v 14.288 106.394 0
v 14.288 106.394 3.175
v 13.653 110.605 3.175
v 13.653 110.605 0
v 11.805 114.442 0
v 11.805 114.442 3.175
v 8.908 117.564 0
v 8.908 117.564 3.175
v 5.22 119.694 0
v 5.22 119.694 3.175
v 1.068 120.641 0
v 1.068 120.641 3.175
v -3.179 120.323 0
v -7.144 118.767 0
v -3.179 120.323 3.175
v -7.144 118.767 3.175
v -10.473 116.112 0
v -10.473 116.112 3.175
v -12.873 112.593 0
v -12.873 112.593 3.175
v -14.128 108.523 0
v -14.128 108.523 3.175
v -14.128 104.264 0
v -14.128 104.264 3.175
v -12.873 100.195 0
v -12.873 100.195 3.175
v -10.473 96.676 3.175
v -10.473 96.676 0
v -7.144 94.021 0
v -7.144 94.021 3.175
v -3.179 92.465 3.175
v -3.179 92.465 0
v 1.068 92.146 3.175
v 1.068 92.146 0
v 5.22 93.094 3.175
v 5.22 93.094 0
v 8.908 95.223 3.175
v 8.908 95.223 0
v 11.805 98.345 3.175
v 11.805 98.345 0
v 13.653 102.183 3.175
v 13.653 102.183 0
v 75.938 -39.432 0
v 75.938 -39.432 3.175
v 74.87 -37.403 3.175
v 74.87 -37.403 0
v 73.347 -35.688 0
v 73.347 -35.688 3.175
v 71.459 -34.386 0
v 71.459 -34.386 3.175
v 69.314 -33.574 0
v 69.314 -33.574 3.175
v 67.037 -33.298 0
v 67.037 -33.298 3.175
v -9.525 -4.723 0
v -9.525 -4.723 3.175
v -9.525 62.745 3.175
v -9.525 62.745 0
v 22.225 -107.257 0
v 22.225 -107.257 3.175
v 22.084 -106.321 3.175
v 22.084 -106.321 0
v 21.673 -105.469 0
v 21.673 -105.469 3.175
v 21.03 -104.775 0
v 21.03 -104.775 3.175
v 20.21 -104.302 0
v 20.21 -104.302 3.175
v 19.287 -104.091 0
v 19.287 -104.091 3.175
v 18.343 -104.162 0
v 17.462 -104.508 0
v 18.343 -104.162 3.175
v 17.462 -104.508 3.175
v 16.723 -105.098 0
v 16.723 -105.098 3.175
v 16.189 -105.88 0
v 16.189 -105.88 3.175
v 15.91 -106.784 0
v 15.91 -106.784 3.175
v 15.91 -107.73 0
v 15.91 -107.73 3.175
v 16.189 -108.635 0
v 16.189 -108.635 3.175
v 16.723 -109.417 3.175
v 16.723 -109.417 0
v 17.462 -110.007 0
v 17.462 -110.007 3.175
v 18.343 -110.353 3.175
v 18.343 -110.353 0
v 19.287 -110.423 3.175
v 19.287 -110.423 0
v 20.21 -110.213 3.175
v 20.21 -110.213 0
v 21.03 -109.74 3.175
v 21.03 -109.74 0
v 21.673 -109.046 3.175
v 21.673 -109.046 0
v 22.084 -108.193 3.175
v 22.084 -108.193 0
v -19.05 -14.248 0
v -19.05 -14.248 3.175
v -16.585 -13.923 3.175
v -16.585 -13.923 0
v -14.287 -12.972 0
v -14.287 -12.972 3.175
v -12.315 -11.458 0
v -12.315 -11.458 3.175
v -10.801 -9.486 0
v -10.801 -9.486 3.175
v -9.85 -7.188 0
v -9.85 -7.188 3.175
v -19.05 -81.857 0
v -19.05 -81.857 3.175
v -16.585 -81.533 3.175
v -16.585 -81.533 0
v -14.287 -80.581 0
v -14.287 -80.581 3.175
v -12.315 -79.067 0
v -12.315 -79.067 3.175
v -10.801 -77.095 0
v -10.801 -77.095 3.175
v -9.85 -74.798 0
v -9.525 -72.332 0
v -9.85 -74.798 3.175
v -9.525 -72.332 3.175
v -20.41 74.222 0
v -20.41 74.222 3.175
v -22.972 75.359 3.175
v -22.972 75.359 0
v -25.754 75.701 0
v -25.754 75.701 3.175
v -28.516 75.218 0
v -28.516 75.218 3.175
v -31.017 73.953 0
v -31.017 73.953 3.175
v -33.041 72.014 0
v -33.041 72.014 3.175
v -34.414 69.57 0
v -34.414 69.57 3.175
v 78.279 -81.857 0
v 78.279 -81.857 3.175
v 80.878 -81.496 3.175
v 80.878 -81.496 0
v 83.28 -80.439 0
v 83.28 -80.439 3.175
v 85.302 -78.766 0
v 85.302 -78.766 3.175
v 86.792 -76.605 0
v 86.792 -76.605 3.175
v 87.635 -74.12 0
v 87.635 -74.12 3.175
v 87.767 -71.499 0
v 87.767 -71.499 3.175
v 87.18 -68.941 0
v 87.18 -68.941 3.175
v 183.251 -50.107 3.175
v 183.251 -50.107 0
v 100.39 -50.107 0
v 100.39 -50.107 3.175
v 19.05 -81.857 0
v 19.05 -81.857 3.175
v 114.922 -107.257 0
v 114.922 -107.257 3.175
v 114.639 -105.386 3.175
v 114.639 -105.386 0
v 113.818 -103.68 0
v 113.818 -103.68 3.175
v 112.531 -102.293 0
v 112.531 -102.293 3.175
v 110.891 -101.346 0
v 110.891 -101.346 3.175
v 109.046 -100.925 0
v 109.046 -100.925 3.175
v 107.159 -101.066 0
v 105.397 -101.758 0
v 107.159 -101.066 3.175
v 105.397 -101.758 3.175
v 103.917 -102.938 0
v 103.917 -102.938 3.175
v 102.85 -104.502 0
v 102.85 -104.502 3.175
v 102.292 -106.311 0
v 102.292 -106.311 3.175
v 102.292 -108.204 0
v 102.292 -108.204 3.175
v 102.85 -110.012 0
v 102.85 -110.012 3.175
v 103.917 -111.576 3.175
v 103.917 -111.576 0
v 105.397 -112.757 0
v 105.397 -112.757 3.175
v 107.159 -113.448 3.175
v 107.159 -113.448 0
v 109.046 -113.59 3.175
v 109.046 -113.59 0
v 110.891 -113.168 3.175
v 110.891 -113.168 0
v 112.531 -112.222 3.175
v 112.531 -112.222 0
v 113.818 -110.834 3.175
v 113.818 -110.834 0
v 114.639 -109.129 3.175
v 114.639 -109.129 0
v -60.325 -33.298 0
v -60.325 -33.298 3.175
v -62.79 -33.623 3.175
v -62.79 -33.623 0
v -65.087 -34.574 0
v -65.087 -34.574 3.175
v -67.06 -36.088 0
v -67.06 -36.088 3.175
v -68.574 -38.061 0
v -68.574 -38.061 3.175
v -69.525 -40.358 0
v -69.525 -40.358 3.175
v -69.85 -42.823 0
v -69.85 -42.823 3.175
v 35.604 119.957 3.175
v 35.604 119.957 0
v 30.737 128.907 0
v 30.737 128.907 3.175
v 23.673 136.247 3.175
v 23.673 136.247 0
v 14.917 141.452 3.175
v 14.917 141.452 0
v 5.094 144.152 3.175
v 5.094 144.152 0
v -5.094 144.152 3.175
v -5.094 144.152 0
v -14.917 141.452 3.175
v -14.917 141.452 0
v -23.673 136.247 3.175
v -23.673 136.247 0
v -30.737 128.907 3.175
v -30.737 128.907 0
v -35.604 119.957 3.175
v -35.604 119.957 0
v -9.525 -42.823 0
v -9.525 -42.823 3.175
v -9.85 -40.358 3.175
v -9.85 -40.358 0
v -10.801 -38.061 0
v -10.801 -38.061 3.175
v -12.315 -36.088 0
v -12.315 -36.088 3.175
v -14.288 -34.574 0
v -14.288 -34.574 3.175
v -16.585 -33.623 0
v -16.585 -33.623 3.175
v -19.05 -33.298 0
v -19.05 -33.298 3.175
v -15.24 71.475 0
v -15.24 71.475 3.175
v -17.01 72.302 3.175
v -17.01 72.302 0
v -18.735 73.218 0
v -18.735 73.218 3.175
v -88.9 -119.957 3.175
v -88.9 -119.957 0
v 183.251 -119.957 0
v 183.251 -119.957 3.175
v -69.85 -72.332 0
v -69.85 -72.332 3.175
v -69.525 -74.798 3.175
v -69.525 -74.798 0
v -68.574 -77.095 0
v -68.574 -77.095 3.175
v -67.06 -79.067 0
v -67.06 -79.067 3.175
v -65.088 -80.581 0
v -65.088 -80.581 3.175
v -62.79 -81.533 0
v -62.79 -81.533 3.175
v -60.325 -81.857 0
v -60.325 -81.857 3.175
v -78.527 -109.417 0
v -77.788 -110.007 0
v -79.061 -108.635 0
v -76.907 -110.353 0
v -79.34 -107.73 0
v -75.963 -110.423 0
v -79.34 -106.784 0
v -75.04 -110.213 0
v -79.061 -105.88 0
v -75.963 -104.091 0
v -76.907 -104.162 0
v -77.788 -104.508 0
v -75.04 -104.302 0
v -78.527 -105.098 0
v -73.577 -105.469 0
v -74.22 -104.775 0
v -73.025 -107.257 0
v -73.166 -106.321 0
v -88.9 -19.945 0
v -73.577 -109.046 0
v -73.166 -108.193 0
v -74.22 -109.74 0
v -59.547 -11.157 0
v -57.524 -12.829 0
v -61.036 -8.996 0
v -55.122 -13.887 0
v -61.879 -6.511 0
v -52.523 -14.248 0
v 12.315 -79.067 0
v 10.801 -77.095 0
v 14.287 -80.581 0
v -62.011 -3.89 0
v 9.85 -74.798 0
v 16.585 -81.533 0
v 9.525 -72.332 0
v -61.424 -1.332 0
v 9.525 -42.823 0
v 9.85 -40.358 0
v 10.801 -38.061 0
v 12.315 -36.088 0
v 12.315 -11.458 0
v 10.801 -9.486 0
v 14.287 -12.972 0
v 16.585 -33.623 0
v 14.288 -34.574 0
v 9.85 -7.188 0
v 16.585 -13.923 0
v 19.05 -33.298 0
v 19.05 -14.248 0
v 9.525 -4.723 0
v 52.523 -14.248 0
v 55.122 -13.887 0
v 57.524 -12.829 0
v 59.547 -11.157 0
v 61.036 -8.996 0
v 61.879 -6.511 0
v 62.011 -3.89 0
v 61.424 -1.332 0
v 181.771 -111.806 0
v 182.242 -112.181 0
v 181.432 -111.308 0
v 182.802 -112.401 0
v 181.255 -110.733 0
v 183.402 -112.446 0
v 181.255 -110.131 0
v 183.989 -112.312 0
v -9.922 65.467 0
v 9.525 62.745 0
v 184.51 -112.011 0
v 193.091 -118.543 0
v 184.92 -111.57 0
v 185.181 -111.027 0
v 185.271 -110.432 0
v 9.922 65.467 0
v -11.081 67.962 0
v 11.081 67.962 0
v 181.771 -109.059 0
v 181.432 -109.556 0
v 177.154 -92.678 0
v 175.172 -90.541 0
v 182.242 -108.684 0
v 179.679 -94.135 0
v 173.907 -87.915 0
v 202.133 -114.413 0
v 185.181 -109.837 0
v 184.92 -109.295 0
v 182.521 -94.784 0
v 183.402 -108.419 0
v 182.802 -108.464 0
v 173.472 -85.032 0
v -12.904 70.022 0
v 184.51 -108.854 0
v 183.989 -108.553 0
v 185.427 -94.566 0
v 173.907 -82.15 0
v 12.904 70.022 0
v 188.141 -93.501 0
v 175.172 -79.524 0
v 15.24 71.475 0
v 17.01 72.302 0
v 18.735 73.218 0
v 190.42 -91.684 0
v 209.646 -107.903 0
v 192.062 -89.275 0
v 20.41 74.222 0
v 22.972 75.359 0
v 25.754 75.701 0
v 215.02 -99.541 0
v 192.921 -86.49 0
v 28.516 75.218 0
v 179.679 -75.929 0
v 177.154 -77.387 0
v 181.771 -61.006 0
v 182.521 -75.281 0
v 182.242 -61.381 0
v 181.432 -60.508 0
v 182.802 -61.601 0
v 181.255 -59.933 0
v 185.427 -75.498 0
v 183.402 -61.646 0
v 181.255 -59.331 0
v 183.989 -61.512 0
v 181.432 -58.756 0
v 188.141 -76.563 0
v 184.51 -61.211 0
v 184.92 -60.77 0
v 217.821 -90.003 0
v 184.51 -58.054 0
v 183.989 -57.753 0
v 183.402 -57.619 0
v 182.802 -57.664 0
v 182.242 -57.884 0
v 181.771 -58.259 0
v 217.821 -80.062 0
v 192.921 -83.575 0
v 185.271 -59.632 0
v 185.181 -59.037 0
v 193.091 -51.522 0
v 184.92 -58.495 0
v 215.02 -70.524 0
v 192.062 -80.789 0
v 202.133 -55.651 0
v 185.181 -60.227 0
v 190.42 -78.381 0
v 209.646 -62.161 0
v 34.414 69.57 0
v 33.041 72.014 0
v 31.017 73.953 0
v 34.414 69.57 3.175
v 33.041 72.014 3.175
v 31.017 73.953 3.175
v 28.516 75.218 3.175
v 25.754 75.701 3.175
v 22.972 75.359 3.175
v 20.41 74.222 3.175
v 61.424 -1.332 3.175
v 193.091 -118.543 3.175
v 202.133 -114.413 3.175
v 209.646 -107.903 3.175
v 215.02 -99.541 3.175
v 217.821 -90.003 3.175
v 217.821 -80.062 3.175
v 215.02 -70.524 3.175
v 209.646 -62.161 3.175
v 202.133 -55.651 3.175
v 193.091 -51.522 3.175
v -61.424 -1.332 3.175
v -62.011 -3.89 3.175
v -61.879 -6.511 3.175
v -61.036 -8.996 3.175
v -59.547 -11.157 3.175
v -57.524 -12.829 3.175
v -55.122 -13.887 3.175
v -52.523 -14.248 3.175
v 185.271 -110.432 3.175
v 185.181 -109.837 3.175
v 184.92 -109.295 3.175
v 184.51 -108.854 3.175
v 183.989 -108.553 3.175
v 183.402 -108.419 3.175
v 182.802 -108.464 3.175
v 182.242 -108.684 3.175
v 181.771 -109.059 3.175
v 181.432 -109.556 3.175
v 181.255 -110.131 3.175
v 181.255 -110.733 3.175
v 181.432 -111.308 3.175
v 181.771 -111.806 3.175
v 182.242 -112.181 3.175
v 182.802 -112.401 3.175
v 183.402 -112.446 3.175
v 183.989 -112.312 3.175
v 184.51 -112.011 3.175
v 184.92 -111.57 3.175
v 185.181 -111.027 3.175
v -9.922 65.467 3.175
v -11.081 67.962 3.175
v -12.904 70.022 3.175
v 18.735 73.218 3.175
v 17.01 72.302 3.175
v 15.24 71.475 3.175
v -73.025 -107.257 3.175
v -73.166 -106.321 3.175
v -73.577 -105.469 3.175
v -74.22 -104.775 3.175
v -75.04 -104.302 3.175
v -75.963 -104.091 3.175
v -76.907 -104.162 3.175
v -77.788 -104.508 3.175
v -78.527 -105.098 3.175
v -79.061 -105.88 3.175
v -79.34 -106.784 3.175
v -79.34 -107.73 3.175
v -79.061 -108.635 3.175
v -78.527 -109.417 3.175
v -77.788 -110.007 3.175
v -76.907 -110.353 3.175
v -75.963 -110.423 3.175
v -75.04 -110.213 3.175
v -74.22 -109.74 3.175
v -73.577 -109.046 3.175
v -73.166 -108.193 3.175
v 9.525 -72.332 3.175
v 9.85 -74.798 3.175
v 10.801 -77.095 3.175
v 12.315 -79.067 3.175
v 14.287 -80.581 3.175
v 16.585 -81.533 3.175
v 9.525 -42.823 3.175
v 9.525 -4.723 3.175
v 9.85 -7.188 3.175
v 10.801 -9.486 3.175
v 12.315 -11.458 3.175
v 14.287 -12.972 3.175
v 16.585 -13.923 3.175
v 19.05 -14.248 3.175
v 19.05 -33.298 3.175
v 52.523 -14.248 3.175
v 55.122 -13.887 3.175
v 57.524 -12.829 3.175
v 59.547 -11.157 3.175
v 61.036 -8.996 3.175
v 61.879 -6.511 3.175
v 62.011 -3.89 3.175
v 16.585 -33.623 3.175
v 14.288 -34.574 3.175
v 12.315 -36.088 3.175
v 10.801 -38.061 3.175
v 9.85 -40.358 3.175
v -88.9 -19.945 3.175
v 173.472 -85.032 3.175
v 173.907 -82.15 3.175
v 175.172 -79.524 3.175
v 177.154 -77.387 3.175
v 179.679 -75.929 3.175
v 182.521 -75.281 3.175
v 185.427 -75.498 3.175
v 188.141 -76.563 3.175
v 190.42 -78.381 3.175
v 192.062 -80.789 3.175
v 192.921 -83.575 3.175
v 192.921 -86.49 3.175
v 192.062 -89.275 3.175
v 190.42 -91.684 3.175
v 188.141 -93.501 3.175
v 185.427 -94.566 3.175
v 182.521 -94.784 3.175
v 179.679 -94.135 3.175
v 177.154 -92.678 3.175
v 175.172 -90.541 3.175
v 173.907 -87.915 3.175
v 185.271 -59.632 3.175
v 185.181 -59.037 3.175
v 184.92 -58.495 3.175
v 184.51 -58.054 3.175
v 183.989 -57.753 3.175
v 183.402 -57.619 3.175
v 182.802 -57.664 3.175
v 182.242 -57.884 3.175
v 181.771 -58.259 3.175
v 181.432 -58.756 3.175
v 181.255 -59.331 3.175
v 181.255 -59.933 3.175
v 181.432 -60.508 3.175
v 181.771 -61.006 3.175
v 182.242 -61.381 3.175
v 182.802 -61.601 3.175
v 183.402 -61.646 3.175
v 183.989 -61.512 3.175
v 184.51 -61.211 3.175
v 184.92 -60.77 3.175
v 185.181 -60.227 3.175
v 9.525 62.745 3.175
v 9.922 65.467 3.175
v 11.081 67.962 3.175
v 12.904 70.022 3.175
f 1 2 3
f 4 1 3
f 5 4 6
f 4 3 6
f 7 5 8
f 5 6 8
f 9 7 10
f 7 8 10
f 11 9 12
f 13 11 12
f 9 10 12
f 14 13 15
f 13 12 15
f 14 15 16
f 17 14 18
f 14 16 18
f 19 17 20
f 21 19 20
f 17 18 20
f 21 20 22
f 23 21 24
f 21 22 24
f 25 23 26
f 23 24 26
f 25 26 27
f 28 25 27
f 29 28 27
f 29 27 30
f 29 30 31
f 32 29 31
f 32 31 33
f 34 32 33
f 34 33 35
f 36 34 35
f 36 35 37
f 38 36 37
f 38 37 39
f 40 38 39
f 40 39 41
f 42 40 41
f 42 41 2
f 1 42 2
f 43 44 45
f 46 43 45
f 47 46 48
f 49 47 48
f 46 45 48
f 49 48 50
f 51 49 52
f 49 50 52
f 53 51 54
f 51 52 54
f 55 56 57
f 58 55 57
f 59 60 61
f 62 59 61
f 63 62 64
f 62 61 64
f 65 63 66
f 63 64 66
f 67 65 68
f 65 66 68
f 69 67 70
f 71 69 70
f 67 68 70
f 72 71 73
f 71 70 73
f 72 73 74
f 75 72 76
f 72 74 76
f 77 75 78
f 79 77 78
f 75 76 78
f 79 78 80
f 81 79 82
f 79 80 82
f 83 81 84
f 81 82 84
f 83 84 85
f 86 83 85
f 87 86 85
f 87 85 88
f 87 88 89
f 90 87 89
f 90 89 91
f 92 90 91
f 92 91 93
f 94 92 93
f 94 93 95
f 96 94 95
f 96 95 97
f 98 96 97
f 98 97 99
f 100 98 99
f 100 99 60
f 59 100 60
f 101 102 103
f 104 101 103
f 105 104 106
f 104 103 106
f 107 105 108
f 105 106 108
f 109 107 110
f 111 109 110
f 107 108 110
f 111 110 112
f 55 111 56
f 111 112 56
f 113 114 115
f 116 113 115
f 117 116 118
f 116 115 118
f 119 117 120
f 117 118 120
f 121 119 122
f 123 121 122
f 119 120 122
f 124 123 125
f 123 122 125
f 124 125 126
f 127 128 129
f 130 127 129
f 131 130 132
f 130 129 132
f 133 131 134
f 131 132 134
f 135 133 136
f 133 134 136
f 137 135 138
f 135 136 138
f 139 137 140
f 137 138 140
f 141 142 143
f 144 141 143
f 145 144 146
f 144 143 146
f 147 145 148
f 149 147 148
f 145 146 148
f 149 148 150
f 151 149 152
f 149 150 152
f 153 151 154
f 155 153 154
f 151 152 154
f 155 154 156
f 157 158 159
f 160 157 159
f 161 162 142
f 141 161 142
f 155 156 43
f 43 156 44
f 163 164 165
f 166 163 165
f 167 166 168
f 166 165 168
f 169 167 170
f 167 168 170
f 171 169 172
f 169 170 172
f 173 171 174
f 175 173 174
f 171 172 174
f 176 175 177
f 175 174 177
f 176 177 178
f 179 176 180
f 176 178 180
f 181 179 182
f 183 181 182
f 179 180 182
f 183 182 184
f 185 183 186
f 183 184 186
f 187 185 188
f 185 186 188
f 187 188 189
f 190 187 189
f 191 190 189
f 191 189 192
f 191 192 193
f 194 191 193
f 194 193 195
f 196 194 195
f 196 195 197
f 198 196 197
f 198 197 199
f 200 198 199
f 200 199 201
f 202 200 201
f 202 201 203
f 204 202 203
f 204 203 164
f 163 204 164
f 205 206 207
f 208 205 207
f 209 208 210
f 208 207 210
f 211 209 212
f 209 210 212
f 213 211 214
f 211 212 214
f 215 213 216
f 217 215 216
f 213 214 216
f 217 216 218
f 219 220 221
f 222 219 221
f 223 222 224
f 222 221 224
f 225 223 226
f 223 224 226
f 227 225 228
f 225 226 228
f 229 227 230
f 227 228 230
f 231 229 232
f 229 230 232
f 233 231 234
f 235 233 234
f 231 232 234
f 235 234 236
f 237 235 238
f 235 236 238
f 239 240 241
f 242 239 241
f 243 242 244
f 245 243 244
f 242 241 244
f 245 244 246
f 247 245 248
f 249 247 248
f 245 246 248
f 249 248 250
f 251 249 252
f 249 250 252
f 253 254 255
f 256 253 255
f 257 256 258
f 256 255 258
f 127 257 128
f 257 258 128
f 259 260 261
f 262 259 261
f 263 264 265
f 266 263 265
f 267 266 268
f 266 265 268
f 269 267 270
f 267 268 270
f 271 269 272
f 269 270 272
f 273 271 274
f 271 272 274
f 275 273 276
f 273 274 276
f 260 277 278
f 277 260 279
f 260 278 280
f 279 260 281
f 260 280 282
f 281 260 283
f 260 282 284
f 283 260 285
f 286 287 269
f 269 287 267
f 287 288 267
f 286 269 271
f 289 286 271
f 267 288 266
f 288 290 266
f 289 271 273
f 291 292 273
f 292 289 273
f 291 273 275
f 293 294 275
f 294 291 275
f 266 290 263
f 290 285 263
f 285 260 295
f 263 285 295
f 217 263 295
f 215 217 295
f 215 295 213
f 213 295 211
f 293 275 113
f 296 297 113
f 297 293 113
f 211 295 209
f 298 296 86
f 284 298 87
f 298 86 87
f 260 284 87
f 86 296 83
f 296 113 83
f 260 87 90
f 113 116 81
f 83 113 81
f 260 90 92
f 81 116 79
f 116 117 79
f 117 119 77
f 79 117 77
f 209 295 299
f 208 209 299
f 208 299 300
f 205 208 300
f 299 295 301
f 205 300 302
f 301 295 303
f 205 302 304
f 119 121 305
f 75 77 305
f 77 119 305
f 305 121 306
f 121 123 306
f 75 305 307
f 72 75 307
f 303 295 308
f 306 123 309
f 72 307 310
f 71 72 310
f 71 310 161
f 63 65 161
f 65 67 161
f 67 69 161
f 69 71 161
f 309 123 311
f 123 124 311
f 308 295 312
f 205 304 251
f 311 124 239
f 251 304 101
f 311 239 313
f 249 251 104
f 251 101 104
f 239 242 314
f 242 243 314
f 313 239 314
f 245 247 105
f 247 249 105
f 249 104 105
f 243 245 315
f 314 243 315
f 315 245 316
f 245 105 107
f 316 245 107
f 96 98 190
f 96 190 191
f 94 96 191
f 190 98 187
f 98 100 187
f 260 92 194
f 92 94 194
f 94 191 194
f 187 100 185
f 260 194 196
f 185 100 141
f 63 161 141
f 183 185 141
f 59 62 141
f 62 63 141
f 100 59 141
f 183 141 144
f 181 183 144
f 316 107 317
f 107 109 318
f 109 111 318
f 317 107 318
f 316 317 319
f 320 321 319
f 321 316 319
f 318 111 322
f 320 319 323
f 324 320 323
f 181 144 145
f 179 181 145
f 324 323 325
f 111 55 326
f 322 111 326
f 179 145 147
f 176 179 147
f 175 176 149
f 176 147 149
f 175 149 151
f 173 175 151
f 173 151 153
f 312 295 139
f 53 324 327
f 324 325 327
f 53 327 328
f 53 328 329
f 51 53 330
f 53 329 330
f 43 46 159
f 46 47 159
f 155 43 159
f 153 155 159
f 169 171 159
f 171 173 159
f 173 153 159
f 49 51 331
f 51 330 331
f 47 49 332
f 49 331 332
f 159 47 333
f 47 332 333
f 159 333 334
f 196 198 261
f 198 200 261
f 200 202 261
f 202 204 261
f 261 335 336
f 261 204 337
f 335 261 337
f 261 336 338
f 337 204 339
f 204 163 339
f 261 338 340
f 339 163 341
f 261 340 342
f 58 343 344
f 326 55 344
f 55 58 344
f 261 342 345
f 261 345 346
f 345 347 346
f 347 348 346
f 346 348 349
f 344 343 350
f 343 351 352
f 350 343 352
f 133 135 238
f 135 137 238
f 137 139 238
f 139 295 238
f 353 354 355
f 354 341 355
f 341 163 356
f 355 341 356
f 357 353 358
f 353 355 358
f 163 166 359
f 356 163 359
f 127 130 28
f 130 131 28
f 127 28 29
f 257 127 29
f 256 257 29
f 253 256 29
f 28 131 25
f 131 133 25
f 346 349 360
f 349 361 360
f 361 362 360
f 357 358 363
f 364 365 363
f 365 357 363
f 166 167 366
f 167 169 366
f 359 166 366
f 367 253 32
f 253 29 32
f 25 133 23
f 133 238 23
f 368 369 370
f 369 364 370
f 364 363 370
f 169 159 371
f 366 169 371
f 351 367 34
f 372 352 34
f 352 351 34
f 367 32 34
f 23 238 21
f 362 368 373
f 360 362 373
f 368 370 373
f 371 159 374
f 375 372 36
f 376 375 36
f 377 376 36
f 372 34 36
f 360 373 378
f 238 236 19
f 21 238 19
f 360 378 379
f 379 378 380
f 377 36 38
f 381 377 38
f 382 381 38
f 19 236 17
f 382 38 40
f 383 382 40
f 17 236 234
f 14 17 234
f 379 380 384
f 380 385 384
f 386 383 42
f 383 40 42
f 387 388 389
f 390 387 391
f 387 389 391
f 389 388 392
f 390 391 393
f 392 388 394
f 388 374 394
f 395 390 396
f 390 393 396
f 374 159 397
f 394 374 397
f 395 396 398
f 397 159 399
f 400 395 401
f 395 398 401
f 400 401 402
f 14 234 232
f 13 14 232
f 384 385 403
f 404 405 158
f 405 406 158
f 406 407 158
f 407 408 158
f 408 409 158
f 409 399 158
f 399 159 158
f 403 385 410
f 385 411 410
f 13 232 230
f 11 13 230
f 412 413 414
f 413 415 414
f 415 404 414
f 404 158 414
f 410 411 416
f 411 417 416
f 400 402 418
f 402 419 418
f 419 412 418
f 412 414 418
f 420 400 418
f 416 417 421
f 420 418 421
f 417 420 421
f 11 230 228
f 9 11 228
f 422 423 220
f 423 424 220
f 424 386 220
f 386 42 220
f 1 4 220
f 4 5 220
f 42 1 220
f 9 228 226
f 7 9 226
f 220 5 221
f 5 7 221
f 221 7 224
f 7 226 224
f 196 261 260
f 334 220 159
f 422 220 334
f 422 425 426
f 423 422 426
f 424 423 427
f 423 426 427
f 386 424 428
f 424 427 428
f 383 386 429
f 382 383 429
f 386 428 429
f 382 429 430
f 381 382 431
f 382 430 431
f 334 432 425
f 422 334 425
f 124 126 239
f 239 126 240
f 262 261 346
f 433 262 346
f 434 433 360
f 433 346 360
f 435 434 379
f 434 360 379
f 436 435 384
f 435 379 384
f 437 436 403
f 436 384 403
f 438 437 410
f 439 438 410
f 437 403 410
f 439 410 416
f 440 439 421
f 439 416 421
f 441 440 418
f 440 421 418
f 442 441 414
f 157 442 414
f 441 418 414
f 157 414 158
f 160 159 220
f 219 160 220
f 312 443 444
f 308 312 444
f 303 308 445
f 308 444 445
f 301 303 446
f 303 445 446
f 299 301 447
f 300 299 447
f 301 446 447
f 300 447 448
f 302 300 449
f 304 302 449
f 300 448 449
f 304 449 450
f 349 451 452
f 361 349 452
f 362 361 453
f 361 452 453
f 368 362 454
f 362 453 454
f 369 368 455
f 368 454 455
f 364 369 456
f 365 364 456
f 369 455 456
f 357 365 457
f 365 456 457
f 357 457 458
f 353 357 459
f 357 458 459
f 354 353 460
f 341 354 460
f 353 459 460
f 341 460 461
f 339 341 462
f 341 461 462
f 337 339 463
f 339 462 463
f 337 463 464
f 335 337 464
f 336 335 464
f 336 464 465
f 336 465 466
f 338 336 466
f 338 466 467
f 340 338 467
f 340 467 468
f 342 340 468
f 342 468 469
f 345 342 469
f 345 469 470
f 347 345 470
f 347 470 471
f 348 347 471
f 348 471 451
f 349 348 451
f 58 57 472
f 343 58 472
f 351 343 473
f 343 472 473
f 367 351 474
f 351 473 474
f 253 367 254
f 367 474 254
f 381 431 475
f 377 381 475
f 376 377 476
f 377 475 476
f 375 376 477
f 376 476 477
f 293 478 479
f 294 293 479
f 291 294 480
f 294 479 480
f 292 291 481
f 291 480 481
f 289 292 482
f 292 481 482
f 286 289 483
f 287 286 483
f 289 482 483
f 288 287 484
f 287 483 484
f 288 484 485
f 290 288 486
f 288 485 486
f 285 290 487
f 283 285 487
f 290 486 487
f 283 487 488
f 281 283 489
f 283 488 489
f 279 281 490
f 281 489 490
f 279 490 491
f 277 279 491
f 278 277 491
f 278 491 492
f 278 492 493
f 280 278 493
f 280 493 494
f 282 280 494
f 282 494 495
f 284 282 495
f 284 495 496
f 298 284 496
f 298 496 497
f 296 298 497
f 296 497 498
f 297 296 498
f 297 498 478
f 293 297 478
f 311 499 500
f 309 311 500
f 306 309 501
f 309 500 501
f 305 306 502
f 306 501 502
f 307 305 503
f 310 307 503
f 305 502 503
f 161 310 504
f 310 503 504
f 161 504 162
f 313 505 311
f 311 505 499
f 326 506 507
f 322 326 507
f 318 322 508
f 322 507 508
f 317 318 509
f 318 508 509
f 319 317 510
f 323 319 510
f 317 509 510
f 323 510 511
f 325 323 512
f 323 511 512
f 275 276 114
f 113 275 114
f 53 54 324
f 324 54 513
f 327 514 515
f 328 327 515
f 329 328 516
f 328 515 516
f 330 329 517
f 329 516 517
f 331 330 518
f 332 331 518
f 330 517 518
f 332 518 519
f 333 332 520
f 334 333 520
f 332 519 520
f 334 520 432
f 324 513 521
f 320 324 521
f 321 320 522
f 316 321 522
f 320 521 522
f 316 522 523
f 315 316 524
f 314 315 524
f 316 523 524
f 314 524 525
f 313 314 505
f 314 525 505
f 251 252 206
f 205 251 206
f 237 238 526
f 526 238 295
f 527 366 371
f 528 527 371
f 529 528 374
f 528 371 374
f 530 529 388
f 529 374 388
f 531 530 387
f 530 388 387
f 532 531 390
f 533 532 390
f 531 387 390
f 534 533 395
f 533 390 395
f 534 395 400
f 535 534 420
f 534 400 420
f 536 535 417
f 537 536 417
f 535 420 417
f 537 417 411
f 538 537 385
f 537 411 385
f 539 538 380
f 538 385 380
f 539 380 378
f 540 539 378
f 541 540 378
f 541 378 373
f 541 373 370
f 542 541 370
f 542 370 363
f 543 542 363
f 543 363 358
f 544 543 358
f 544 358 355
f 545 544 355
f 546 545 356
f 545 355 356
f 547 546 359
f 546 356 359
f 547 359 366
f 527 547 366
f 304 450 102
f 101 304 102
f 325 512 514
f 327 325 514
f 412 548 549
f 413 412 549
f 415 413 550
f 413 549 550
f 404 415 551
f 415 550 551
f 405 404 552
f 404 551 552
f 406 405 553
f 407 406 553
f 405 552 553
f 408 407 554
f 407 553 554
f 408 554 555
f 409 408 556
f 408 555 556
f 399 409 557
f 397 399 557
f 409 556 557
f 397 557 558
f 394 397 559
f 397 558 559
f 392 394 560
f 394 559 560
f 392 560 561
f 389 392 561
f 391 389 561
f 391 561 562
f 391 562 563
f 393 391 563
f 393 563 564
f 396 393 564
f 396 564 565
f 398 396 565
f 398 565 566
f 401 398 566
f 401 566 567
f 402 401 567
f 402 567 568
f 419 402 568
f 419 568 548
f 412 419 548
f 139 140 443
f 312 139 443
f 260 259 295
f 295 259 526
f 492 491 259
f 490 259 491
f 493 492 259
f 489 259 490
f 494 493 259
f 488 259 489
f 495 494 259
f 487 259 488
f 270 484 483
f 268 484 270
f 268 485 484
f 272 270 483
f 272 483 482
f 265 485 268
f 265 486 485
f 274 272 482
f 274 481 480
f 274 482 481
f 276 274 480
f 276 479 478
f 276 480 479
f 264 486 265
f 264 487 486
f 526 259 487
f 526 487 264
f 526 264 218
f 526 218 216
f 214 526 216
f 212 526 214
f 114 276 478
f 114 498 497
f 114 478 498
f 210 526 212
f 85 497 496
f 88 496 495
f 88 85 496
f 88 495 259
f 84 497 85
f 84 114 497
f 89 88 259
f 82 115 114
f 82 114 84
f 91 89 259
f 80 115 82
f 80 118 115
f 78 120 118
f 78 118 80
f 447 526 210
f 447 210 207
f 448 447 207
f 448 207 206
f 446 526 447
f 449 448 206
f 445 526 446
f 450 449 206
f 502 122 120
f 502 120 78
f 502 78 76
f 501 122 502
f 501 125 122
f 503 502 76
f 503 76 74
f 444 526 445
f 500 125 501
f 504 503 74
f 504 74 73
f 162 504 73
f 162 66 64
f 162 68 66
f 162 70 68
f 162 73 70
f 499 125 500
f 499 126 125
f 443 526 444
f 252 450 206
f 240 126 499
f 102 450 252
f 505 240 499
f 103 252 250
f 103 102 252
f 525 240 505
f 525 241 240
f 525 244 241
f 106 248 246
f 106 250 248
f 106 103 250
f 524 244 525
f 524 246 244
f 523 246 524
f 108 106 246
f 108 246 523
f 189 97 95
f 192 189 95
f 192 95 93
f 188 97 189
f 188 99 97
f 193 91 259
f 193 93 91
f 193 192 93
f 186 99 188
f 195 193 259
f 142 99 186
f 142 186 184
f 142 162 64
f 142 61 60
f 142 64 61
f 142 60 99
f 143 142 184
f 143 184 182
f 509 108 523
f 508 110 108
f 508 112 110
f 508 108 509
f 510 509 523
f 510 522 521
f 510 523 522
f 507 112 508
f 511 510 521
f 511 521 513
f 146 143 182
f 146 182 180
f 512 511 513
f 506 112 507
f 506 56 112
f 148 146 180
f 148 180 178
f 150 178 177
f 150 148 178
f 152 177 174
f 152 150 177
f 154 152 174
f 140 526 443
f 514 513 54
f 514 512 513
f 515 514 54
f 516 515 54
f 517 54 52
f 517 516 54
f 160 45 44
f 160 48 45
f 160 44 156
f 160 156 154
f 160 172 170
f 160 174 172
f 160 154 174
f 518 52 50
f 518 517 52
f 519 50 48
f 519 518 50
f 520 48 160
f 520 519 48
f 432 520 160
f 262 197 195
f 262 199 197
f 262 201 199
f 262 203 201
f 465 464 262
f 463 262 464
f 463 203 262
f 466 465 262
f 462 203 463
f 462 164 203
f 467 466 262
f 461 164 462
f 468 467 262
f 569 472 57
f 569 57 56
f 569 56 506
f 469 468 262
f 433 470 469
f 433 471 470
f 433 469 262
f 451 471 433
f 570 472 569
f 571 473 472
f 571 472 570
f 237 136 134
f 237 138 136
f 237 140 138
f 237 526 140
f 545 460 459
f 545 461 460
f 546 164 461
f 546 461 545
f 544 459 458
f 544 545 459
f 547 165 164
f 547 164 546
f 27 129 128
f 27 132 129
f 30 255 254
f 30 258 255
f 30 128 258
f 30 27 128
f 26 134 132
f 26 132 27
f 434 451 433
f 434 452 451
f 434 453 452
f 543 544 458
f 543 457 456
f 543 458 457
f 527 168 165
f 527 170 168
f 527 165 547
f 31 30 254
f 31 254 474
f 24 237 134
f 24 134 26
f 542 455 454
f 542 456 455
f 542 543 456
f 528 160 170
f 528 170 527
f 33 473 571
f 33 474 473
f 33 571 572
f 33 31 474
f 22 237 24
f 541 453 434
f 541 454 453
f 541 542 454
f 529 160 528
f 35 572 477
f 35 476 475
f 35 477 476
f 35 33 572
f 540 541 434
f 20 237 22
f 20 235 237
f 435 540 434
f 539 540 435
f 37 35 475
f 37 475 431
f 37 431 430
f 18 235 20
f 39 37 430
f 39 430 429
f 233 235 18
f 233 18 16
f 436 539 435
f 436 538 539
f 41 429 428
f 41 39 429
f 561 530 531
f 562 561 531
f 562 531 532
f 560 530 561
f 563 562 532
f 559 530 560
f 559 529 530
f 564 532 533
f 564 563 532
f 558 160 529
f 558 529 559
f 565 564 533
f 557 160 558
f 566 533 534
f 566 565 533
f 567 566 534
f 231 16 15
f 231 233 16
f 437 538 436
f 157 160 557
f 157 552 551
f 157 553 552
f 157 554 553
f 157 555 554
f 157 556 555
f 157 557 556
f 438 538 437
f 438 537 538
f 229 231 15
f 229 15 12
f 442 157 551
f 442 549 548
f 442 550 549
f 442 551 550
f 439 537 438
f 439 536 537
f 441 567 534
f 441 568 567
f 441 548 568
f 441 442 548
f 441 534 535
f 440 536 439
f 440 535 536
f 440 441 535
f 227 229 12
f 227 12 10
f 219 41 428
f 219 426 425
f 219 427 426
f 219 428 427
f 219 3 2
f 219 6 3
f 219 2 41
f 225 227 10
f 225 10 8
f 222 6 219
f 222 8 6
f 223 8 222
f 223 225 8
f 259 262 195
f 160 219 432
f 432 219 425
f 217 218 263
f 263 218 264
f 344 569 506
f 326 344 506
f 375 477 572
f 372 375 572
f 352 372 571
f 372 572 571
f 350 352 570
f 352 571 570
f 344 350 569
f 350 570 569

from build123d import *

# Parameters (mm, degrees)
BOSS_EXTRUDE1_DEPTH = 3.175
SKETCH2_R           = 14.2875
CUT_EXTRUDE1_DEPTH  = 4.175
SKETCH4_R           = 6.35
SKETCH4_R_2         = 3.175
CUT_EXTRUDE2_DEPTH  = 4.175
SKETCH8_R           = 9.779
BOSS_EXTRUDE3_DEPTH = 3.175
SKETCH9_R           = 2.0193
CUT_EXTRUDE3_DEPTH  = 4.175
SKETCH10_W          = 38.1
SKETCH10_H          = 100.0125
CUT_EXTRUDE4_DEPTH  = 4.175
CUT_EXTRUDE5_DEPTH  = 4.175


with BuildPart() as part:
    # Sketch1 → Boss-Extrude1 (new body)
    with BuildSketch(Plane.XY):
        with BuildLine():
            Line((-35.603982701, 119.957272705), (-127, -119.957272705))
            Line((-127, -119.957272705), (127, -119.957272705))
            Line((127, -119.957272705), (35.603982701, 119.957272705))
            ThreePointArc((35.603982701, 119.957272705), (0, 144.493850724), (-35.603982701, 119.957272705))
        make_face()
    extrude(amount=BOSS_EXTRUDE1_DEPTH)

    # Sketch2 → Cut-Extrude1 (cut, through all)
    with BuildSketch(Plane.XY.offset(3.175)):
        with Locations((0, 106.393850724)):
            Circle(SKETCH2_R)
    extrude(amount=-CUT_EXTRUDE1_DEPTH, mode=Mode.SUBTRACT)

    # Sketch4 → Cut-Extrude2 (cut, through all)
    with BuildSketch(Plane.XY.offset(3.175)):
        with Locations((108.571571229, -107.257272705)):
            Circle(SKETCH4_R)
        with Locations((-76.2, -107.257272705)):
            Circle(SKETCH4_R_2)
        with Locations((19.05, -107.257272705)):
            Circle(SKETCH4_R_2)
    extrude(amount=-CUT_EXTRUDE2_DEPTH, mode=Mode.SUBTRACT)

    # Sketch8 → Boss-Extrude3 (add)
    with BuildSketch(Plane(origin=(0, 0, 0), x_dir=(-1, 0, 0), z_dir=(0, 0, -1))):
        with BuildLine():
            Line((-127, -119.957272705), (-183.251300865, -119.957272705))
            ThreePointArc((-183.251300865, -119.957272705), (-218.176300865, -85.032272705), (-183.251300865, -50.107272705))
            Line((-183.251300865, -50.107272705), (-100.39047619, -50.107272705))
            Line((-100.39047619, -50.107272705), (-127, -119.957272705))
        make_face()
        with Locations((-183.251300865, -85.032272705)):
            Circle(SKETCH8_R, mode=Mode.SUBTRACT)
    extrude(amount=-BOSS_EXTRUDE3_DEPTH)

    # Sketch9 → Cut-Extrude3 (cut, through all)
    with BuildSketch(Plane.XY.offset(3.175)):
        with Locations((183.251300865, -59.632272705)):
            Circle(SKETCH9_R)
        with Locations((183.251300865, -110.432272705)):
            Circle(SKETCH9_R)
    extrude(amount=-CUT_EXTRUDE3_DEPTH, mode=Mode.SUBTRACT)

    # Sketch10 → Cut-Extrude4 (cut, through all)
    with BuildSketch(Plane.XY.offset(3.175)):
        with Locations((-107.95, -69.951022705)):
            Rectangle(SKETCH10_W, SKETCH10_H)
    extrude(amount=-CUT_EXTRUDE4_DEPTH, mode=Mode.SUBTRACT)

    # Sketch11 → Cut-Extrude5 (cut, through all)
    with BuildSketch(Plane.XY.offset(3.175)):
        with BuildLine():
            Line((-34.41372286, 69.569766501), (-61.423985812, -1.332173746))
            ThreePointArc((-61.423985812, -1.332173746), (-60.365933576, -10.128014274), (-52.522990136, -14.248029241))
            Line((-52.522990136, -14.248029241), (-19.05, -14.248029241))
            ThreePointArc((-19.05, -14.248029241), (-12.314807909, -11.458221332), (-9.525, -4.723029241))
            Line((-9.525, -4.723029241), (-9.525, 62.74481723))
            ThreePointArc((-9.525, 62.74481723), (-11.080813247, 67.96187459), (-15.24, 71.474623928))
            ThreePointArc((-15.24, 71.474623928), (-17.877940169, 72.748802718), (-20.410181748, 74.221898949))
            ThreePointArc((-20.410181748, 74.221898949), (-28.515665768, 75.218157925), (-34.41372286, 69.569766501))
        make_face()
        with BuildLine():
            Line((19.05, -14.248029241), (52.522990136, -14.248029241))
            ThreePointArc((52.522990136, -14.248029241), (60.365933576, -10.128014274), (61.423985812, -1.332173746))
            Line((61.423985812, -1.332173746), (34.41372286, 69.569766501))
            ThreePointArc((34.41372286, 69.569766501), (28.515665768, 75.218157925), (20.410181748, 74.221898949))
            ThreePointArc((20.410181748, 74.221898949), (17.877940169, 72.748802718), (15.24, 71.474623928))
            ThreePointArc((15.24, 71.474623928), (11.080813247, 67.96187459), (9.525, 62.74481723))
            Line((9.525, 62.74481723), (9.525, -4.723029241))
            ThreePointArc((9.525, -4.723029241), (12.314807909, -11.458221332), (19.05, -14.248029241))
        make_face()
        with BuildLine():
            Line((-19.05, -33.298029241), (-60.325, -33.298029241))
            ThreePointArc((-60.325, -33.298029241), (-67.060192091, -36.087837151), (-69.85, -42.823029241))
            Line((-69.85, -42.823029241), (-69.85, -72.332272705))
            ThreePointArc((-69.85, -72.332272705), (-67.060192091, -79.067464796), (-60.325, -81.857272705))
            Line((-60.325, -81.857272705), (-19.05, -81.857272705))
            ThreePointArc((-19.05, -81.857272705), (-12.314807909, -79.067464796), (-9.525, -72.332272705))
            Line((-9.525, -72.332272705), (-9.525, -42.823029241))
            ThreePointArc((-9.525, -42.823029241), (-12.314807909, -36.087837151), (-19.05, -33.298029241))
        make_face()
        with BuildLine():
            Line((9.525, -42.823029241), (9.525, -72.332272705))
            ThreePointArc((9.525, -72.332272705), (12.314807909, -79.067464796), (19.05, -81.857272705))
            Line((19.05, -81.857272705), (78.278892408, -81.857272705))
            ThreePointArc((78.278892408, -81.857272705), (86.121835848, -77.737257738), (87.179888084, -68.94141721))
            Line((87.179888084, -68.94141721), (75.938271526, -39.432173746))
            ThreePointArc((75.938271526, -39.432173746), (72.442260883, -34.980085802), (67.037275851, -33.298029241))
            Line((67.037275851, -33.298029241), (19.05, -33.298029241))
            ThreePointArc((19.05, -33.298029241), (12.314807909, -36.087837151), (9.525, -42.823029241))
        make_face()
    extrude(amount=-CUT_EXTRUDE5_DEPTH, mode=Mode.SUBTRACT)


solid = part.part
